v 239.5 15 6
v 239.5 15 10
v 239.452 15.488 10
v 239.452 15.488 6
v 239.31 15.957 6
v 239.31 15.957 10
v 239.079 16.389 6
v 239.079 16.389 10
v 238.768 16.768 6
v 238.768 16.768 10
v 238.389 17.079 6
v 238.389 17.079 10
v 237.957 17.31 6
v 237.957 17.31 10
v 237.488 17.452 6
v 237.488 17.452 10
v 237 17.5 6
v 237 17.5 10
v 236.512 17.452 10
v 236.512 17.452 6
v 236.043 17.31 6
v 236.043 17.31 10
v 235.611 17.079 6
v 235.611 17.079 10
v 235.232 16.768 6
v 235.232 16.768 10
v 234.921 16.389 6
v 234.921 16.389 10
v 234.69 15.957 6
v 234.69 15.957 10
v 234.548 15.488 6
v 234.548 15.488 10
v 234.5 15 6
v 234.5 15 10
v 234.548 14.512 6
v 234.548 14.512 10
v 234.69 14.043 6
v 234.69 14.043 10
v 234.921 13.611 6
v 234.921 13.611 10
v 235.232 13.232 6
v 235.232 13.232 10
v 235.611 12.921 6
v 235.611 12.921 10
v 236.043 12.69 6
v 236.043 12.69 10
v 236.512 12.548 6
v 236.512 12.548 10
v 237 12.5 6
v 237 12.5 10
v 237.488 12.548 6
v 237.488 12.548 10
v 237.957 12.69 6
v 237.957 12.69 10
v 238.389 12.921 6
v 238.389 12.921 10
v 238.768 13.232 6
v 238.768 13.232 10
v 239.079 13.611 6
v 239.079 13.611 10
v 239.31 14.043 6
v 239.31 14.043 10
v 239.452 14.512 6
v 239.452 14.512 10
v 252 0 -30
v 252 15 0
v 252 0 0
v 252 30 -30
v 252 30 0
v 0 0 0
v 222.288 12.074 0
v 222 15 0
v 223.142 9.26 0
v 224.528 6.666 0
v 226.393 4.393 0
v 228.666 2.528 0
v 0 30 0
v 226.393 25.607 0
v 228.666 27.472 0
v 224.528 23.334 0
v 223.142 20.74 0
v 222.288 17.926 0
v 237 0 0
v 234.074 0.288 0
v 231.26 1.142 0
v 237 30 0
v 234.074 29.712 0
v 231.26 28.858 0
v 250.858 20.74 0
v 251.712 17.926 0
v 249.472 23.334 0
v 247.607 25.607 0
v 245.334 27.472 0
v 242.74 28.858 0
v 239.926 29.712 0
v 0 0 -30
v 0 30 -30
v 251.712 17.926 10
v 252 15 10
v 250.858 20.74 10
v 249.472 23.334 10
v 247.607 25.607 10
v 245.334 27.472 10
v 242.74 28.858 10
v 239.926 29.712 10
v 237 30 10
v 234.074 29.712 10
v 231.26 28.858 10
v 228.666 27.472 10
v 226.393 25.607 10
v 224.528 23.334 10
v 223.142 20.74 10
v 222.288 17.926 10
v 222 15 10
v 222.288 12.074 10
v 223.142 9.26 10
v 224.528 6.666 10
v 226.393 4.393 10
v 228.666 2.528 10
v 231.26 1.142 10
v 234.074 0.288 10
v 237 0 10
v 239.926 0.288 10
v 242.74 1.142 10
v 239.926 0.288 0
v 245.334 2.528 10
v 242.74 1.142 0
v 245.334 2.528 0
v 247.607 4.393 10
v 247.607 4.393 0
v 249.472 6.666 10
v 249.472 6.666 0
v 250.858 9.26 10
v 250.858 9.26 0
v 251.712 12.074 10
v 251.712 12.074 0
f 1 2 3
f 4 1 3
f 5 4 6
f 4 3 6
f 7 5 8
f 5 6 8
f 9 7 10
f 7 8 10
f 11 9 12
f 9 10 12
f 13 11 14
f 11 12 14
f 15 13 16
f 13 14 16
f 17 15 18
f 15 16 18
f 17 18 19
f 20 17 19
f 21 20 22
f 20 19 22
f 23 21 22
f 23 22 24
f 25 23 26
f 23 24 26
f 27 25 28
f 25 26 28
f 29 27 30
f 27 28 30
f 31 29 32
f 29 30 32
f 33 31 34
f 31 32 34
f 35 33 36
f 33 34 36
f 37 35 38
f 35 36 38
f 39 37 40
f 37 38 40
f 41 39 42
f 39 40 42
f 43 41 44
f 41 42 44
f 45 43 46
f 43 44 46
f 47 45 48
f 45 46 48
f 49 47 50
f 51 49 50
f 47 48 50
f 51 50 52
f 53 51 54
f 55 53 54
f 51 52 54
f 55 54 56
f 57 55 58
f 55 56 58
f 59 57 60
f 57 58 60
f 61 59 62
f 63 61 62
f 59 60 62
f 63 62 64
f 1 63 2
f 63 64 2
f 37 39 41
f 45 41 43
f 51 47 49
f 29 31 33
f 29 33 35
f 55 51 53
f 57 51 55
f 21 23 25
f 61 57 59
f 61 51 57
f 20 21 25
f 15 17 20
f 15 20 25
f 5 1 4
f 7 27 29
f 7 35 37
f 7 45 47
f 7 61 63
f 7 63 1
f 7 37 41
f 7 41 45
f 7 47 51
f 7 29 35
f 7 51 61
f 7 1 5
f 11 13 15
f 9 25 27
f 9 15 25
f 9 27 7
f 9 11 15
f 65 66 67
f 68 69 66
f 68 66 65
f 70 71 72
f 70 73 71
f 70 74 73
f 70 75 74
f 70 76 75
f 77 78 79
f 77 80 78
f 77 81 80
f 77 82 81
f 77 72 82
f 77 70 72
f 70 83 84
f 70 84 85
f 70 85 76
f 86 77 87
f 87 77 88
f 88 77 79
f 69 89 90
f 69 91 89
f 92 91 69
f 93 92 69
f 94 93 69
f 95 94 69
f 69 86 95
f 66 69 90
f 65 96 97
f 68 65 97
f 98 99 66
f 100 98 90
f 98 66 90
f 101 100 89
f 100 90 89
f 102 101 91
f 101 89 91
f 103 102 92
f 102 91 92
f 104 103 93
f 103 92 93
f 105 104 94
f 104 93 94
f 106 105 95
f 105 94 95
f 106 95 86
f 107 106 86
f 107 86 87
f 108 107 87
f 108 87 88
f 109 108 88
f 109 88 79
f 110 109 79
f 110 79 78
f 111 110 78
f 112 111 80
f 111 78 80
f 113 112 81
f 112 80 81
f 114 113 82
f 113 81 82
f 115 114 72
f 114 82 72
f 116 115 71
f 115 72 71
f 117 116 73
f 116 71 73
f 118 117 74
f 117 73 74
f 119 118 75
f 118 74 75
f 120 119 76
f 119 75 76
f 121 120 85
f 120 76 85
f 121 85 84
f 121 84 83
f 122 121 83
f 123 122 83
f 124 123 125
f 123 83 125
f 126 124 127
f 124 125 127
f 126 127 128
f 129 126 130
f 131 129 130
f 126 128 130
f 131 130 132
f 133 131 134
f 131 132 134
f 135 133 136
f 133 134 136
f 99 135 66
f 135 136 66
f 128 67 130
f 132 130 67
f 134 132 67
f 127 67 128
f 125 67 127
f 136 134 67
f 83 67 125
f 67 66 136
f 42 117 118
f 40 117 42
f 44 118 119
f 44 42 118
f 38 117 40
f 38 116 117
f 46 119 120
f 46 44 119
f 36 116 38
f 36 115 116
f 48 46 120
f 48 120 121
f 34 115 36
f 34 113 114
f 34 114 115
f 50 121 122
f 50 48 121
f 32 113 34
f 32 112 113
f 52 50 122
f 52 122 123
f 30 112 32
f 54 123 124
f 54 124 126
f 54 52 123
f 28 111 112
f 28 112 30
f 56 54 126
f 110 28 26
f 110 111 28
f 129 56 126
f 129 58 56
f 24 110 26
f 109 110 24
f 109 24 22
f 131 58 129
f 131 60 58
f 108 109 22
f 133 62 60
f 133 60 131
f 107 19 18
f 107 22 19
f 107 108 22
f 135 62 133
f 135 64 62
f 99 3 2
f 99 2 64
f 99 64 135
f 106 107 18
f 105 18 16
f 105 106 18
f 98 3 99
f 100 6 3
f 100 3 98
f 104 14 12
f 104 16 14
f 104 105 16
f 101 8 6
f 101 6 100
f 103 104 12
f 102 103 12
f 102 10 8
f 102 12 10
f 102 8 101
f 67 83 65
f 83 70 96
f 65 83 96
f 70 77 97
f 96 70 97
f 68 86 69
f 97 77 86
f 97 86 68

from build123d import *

# Parameters (mm, degrees)
SKETCH2_W           = 30
SKETCH2_H           = 30
BOSS_EXTRUDE1_DEPTH = 252
SKETCH3_R           = 15
BOSS_EXTRUDE2_DEPTH = 10
SKETCH4_R           = 2.5
CUT_EXTRUDE1_DEPTH  = 4


with BuildPart() as part:
    # Sketch2 → Boss-Extrude1 (new body)
    with BuildSketch(Plane(origin=(0, 0, 0), x_dir=(0, 0, -1), z_dir=(1, 0, 0))):
        with Locations((15, 15)):
            Rectangle(SKETCH2_W, SKETCH2_H)
    extrude(amount=BOSS_EXTRUDE1_DEPTH)

    # Sketch3 → Boss-Extrude2 (add)
    with BuildSketch(Plane.XY):
        with Locations((237, 15)):
            Circle(SKETCH3_R)
    extrude(amount=BOSS_EXTRUDE2_DEPTH)

    # Sketch4 → Cut-Extrude1 (cut)
    with BuildSketch(Plane.XY.offset(10)):
        with Locations((237, 15)):
            Circle(SKETCH4_R)
    extrude(amount=-CUT_EXTRUDE1_DEPTH, mode=Mode.SUBTRACT)


solid = part.part
